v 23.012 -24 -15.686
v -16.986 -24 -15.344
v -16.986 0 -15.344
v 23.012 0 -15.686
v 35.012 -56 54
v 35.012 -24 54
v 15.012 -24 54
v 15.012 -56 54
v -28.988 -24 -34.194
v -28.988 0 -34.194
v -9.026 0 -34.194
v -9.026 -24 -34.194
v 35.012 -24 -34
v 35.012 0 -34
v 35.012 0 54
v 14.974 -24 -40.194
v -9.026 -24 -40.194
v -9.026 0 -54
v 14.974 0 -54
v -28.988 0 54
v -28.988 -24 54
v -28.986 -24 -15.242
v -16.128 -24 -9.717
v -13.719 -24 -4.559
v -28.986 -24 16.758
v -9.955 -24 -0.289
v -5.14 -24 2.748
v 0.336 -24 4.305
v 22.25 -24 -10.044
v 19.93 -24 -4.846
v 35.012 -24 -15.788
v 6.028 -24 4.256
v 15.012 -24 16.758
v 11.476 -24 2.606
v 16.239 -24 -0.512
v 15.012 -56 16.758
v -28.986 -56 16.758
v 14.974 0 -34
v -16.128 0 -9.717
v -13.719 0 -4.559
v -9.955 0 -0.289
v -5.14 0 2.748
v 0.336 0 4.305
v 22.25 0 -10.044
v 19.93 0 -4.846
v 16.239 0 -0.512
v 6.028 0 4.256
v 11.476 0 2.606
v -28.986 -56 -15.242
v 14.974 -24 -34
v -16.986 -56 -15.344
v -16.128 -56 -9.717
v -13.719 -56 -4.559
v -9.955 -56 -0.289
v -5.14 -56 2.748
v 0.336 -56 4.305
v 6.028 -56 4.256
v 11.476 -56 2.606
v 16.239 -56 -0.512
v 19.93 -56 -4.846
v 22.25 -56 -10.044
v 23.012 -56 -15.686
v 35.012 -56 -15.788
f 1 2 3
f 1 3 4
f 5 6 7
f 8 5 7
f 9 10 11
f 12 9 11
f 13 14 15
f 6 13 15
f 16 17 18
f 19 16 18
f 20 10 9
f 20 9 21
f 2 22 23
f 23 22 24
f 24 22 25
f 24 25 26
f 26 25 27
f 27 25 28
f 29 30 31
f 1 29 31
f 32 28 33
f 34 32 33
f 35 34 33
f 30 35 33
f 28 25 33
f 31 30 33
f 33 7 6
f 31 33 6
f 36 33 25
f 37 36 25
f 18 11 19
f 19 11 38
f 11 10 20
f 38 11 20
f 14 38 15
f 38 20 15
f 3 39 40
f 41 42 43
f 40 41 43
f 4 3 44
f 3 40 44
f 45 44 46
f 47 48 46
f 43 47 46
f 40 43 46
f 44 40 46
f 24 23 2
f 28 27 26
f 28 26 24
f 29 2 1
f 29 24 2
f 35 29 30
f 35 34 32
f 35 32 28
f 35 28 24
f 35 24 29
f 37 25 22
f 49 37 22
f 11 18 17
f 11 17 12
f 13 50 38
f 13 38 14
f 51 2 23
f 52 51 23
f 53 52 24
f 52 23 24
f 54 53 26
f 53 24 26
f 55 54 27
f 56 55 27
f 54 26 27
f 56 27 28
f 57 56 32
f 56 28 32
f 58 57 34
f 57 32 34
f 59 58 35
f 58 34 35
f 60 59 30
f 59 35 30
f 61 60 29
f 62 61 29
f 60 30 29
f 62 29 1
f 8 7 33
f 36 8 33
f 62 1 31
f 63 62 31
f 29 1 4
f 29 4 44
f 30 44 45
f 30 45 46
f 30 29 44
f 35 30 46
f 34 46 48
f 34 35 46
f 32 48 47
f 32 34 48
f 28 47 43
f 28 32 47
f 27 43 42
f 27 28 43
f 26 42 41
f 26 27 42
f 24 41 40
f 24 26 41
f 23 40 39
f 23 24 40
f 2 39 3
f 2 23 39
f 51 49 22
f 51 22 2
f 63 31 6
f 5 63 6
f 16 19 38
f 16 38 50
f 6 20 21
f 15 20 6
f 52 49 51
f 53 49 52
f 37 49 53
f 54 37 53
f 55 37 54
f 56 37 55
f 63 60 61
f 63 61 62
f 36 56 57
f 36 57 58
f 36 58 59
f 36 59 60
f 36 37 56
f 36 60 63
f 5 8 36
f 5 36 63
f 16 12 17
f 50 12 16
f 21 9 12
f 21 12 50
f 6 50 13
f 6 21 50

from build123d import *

# Parameters (mm, degrees)
F0_W      = 64
F0_H      = 108
F1_DEPTH  = 24
F3_DEPTH  = 32
F4_DEPTH  = 24
F5_W      = 20
F5_H      = 20
F6_DEPTH  = 25
F7_W      = 20.03756
F7_H      = 24
F8_DEPTH  = 20
F10_DEPTH = 25


with BuildPart() as f1:
    # F0 (on Front) → F1 (new body)
    with BuildSketch(Plane.XZ):
        with Locations((3.011967, 0)):
            Rectangle(F0_W, F0_H)
    extrude(amount=F1_DEPTH)

    # F5 (on face) → F6 (cut)
    with BuildSketch(Plane.XZ.offset(24)):
        with Locations((-19.025593, -44.19416)):
            Rectangle(F5_W, F5_H)
    extrude(amount=-F6_DEPTH, mode=Mode.SUBTRACT)

    # F7 (on face) → F8 (cut)
    with BuildSketch(Plane(origin=(0, 0, -54), x_dir=(1, 0, 0), z_dir=(0, 0, -1))):
        with Locations((24.993187, 12)):
            Rectangle(F7_W, F7_H)
    extrude(amount=-F8_DEPTH, mode=Mode.SUBTRACT)

    # F9 (on face) → F10 (cut)
    with BuildSketch(Plane(origin=(-9.025593, 0, 0), x_dir=(0, -1, 0), z_dir=(-1, 0, 0))):
        Polygon((24, -54), (24, -40.19416), (0, -54), align=None)
    extrude(amount=-F10_DEPTH, mode=Mode.SUBTRACT)


with BuildPart() as f3:
    # F2 (on face) → F3 (new body)
    with BuildSketch(Plane.XZ.offset(24)):
        with BuildLine():
            Line((35.011967, 54), (15.011967, 54))
            Line((15.011967, 54), (15.011967, 16.758138))
            Line((15.011967, 16.758138), (-28.9857, 16.758138))
            Line((-28.9857, 16.758138), (-28.9857, -15.241862))
            Line((-28.9857, -15.241862), (-16.986138, -15.344322))
            ThreePointArc((-16.986138, -15.344322), (3.1839, 4.484182), (23.012404, -15.685855))
            Line((23.012404, -15.685855), (35.011967, -15.788315))
            Line((35.011967, -15.788315), (35.011967, 54))
        make_face()
    extrude(amount=F3_DEPTH)


with BuildPart() as f4:
    # F2 (on face) → F4 (new body)
    with BuildSketch(Plane.XZ.offset(24)):
        with BuildLine():
            ThreePointArc((23.012404, -15.685855), (3.1839, 4.484182), (-16.986138, -15.344322))
            Line((-16.986138, -15.344322), (23.012404, -15.685855))
        make_face()
    extrude(amount=-F4_DEPTH)


solid = Compound([f1.part, f3.part, f4.part])
